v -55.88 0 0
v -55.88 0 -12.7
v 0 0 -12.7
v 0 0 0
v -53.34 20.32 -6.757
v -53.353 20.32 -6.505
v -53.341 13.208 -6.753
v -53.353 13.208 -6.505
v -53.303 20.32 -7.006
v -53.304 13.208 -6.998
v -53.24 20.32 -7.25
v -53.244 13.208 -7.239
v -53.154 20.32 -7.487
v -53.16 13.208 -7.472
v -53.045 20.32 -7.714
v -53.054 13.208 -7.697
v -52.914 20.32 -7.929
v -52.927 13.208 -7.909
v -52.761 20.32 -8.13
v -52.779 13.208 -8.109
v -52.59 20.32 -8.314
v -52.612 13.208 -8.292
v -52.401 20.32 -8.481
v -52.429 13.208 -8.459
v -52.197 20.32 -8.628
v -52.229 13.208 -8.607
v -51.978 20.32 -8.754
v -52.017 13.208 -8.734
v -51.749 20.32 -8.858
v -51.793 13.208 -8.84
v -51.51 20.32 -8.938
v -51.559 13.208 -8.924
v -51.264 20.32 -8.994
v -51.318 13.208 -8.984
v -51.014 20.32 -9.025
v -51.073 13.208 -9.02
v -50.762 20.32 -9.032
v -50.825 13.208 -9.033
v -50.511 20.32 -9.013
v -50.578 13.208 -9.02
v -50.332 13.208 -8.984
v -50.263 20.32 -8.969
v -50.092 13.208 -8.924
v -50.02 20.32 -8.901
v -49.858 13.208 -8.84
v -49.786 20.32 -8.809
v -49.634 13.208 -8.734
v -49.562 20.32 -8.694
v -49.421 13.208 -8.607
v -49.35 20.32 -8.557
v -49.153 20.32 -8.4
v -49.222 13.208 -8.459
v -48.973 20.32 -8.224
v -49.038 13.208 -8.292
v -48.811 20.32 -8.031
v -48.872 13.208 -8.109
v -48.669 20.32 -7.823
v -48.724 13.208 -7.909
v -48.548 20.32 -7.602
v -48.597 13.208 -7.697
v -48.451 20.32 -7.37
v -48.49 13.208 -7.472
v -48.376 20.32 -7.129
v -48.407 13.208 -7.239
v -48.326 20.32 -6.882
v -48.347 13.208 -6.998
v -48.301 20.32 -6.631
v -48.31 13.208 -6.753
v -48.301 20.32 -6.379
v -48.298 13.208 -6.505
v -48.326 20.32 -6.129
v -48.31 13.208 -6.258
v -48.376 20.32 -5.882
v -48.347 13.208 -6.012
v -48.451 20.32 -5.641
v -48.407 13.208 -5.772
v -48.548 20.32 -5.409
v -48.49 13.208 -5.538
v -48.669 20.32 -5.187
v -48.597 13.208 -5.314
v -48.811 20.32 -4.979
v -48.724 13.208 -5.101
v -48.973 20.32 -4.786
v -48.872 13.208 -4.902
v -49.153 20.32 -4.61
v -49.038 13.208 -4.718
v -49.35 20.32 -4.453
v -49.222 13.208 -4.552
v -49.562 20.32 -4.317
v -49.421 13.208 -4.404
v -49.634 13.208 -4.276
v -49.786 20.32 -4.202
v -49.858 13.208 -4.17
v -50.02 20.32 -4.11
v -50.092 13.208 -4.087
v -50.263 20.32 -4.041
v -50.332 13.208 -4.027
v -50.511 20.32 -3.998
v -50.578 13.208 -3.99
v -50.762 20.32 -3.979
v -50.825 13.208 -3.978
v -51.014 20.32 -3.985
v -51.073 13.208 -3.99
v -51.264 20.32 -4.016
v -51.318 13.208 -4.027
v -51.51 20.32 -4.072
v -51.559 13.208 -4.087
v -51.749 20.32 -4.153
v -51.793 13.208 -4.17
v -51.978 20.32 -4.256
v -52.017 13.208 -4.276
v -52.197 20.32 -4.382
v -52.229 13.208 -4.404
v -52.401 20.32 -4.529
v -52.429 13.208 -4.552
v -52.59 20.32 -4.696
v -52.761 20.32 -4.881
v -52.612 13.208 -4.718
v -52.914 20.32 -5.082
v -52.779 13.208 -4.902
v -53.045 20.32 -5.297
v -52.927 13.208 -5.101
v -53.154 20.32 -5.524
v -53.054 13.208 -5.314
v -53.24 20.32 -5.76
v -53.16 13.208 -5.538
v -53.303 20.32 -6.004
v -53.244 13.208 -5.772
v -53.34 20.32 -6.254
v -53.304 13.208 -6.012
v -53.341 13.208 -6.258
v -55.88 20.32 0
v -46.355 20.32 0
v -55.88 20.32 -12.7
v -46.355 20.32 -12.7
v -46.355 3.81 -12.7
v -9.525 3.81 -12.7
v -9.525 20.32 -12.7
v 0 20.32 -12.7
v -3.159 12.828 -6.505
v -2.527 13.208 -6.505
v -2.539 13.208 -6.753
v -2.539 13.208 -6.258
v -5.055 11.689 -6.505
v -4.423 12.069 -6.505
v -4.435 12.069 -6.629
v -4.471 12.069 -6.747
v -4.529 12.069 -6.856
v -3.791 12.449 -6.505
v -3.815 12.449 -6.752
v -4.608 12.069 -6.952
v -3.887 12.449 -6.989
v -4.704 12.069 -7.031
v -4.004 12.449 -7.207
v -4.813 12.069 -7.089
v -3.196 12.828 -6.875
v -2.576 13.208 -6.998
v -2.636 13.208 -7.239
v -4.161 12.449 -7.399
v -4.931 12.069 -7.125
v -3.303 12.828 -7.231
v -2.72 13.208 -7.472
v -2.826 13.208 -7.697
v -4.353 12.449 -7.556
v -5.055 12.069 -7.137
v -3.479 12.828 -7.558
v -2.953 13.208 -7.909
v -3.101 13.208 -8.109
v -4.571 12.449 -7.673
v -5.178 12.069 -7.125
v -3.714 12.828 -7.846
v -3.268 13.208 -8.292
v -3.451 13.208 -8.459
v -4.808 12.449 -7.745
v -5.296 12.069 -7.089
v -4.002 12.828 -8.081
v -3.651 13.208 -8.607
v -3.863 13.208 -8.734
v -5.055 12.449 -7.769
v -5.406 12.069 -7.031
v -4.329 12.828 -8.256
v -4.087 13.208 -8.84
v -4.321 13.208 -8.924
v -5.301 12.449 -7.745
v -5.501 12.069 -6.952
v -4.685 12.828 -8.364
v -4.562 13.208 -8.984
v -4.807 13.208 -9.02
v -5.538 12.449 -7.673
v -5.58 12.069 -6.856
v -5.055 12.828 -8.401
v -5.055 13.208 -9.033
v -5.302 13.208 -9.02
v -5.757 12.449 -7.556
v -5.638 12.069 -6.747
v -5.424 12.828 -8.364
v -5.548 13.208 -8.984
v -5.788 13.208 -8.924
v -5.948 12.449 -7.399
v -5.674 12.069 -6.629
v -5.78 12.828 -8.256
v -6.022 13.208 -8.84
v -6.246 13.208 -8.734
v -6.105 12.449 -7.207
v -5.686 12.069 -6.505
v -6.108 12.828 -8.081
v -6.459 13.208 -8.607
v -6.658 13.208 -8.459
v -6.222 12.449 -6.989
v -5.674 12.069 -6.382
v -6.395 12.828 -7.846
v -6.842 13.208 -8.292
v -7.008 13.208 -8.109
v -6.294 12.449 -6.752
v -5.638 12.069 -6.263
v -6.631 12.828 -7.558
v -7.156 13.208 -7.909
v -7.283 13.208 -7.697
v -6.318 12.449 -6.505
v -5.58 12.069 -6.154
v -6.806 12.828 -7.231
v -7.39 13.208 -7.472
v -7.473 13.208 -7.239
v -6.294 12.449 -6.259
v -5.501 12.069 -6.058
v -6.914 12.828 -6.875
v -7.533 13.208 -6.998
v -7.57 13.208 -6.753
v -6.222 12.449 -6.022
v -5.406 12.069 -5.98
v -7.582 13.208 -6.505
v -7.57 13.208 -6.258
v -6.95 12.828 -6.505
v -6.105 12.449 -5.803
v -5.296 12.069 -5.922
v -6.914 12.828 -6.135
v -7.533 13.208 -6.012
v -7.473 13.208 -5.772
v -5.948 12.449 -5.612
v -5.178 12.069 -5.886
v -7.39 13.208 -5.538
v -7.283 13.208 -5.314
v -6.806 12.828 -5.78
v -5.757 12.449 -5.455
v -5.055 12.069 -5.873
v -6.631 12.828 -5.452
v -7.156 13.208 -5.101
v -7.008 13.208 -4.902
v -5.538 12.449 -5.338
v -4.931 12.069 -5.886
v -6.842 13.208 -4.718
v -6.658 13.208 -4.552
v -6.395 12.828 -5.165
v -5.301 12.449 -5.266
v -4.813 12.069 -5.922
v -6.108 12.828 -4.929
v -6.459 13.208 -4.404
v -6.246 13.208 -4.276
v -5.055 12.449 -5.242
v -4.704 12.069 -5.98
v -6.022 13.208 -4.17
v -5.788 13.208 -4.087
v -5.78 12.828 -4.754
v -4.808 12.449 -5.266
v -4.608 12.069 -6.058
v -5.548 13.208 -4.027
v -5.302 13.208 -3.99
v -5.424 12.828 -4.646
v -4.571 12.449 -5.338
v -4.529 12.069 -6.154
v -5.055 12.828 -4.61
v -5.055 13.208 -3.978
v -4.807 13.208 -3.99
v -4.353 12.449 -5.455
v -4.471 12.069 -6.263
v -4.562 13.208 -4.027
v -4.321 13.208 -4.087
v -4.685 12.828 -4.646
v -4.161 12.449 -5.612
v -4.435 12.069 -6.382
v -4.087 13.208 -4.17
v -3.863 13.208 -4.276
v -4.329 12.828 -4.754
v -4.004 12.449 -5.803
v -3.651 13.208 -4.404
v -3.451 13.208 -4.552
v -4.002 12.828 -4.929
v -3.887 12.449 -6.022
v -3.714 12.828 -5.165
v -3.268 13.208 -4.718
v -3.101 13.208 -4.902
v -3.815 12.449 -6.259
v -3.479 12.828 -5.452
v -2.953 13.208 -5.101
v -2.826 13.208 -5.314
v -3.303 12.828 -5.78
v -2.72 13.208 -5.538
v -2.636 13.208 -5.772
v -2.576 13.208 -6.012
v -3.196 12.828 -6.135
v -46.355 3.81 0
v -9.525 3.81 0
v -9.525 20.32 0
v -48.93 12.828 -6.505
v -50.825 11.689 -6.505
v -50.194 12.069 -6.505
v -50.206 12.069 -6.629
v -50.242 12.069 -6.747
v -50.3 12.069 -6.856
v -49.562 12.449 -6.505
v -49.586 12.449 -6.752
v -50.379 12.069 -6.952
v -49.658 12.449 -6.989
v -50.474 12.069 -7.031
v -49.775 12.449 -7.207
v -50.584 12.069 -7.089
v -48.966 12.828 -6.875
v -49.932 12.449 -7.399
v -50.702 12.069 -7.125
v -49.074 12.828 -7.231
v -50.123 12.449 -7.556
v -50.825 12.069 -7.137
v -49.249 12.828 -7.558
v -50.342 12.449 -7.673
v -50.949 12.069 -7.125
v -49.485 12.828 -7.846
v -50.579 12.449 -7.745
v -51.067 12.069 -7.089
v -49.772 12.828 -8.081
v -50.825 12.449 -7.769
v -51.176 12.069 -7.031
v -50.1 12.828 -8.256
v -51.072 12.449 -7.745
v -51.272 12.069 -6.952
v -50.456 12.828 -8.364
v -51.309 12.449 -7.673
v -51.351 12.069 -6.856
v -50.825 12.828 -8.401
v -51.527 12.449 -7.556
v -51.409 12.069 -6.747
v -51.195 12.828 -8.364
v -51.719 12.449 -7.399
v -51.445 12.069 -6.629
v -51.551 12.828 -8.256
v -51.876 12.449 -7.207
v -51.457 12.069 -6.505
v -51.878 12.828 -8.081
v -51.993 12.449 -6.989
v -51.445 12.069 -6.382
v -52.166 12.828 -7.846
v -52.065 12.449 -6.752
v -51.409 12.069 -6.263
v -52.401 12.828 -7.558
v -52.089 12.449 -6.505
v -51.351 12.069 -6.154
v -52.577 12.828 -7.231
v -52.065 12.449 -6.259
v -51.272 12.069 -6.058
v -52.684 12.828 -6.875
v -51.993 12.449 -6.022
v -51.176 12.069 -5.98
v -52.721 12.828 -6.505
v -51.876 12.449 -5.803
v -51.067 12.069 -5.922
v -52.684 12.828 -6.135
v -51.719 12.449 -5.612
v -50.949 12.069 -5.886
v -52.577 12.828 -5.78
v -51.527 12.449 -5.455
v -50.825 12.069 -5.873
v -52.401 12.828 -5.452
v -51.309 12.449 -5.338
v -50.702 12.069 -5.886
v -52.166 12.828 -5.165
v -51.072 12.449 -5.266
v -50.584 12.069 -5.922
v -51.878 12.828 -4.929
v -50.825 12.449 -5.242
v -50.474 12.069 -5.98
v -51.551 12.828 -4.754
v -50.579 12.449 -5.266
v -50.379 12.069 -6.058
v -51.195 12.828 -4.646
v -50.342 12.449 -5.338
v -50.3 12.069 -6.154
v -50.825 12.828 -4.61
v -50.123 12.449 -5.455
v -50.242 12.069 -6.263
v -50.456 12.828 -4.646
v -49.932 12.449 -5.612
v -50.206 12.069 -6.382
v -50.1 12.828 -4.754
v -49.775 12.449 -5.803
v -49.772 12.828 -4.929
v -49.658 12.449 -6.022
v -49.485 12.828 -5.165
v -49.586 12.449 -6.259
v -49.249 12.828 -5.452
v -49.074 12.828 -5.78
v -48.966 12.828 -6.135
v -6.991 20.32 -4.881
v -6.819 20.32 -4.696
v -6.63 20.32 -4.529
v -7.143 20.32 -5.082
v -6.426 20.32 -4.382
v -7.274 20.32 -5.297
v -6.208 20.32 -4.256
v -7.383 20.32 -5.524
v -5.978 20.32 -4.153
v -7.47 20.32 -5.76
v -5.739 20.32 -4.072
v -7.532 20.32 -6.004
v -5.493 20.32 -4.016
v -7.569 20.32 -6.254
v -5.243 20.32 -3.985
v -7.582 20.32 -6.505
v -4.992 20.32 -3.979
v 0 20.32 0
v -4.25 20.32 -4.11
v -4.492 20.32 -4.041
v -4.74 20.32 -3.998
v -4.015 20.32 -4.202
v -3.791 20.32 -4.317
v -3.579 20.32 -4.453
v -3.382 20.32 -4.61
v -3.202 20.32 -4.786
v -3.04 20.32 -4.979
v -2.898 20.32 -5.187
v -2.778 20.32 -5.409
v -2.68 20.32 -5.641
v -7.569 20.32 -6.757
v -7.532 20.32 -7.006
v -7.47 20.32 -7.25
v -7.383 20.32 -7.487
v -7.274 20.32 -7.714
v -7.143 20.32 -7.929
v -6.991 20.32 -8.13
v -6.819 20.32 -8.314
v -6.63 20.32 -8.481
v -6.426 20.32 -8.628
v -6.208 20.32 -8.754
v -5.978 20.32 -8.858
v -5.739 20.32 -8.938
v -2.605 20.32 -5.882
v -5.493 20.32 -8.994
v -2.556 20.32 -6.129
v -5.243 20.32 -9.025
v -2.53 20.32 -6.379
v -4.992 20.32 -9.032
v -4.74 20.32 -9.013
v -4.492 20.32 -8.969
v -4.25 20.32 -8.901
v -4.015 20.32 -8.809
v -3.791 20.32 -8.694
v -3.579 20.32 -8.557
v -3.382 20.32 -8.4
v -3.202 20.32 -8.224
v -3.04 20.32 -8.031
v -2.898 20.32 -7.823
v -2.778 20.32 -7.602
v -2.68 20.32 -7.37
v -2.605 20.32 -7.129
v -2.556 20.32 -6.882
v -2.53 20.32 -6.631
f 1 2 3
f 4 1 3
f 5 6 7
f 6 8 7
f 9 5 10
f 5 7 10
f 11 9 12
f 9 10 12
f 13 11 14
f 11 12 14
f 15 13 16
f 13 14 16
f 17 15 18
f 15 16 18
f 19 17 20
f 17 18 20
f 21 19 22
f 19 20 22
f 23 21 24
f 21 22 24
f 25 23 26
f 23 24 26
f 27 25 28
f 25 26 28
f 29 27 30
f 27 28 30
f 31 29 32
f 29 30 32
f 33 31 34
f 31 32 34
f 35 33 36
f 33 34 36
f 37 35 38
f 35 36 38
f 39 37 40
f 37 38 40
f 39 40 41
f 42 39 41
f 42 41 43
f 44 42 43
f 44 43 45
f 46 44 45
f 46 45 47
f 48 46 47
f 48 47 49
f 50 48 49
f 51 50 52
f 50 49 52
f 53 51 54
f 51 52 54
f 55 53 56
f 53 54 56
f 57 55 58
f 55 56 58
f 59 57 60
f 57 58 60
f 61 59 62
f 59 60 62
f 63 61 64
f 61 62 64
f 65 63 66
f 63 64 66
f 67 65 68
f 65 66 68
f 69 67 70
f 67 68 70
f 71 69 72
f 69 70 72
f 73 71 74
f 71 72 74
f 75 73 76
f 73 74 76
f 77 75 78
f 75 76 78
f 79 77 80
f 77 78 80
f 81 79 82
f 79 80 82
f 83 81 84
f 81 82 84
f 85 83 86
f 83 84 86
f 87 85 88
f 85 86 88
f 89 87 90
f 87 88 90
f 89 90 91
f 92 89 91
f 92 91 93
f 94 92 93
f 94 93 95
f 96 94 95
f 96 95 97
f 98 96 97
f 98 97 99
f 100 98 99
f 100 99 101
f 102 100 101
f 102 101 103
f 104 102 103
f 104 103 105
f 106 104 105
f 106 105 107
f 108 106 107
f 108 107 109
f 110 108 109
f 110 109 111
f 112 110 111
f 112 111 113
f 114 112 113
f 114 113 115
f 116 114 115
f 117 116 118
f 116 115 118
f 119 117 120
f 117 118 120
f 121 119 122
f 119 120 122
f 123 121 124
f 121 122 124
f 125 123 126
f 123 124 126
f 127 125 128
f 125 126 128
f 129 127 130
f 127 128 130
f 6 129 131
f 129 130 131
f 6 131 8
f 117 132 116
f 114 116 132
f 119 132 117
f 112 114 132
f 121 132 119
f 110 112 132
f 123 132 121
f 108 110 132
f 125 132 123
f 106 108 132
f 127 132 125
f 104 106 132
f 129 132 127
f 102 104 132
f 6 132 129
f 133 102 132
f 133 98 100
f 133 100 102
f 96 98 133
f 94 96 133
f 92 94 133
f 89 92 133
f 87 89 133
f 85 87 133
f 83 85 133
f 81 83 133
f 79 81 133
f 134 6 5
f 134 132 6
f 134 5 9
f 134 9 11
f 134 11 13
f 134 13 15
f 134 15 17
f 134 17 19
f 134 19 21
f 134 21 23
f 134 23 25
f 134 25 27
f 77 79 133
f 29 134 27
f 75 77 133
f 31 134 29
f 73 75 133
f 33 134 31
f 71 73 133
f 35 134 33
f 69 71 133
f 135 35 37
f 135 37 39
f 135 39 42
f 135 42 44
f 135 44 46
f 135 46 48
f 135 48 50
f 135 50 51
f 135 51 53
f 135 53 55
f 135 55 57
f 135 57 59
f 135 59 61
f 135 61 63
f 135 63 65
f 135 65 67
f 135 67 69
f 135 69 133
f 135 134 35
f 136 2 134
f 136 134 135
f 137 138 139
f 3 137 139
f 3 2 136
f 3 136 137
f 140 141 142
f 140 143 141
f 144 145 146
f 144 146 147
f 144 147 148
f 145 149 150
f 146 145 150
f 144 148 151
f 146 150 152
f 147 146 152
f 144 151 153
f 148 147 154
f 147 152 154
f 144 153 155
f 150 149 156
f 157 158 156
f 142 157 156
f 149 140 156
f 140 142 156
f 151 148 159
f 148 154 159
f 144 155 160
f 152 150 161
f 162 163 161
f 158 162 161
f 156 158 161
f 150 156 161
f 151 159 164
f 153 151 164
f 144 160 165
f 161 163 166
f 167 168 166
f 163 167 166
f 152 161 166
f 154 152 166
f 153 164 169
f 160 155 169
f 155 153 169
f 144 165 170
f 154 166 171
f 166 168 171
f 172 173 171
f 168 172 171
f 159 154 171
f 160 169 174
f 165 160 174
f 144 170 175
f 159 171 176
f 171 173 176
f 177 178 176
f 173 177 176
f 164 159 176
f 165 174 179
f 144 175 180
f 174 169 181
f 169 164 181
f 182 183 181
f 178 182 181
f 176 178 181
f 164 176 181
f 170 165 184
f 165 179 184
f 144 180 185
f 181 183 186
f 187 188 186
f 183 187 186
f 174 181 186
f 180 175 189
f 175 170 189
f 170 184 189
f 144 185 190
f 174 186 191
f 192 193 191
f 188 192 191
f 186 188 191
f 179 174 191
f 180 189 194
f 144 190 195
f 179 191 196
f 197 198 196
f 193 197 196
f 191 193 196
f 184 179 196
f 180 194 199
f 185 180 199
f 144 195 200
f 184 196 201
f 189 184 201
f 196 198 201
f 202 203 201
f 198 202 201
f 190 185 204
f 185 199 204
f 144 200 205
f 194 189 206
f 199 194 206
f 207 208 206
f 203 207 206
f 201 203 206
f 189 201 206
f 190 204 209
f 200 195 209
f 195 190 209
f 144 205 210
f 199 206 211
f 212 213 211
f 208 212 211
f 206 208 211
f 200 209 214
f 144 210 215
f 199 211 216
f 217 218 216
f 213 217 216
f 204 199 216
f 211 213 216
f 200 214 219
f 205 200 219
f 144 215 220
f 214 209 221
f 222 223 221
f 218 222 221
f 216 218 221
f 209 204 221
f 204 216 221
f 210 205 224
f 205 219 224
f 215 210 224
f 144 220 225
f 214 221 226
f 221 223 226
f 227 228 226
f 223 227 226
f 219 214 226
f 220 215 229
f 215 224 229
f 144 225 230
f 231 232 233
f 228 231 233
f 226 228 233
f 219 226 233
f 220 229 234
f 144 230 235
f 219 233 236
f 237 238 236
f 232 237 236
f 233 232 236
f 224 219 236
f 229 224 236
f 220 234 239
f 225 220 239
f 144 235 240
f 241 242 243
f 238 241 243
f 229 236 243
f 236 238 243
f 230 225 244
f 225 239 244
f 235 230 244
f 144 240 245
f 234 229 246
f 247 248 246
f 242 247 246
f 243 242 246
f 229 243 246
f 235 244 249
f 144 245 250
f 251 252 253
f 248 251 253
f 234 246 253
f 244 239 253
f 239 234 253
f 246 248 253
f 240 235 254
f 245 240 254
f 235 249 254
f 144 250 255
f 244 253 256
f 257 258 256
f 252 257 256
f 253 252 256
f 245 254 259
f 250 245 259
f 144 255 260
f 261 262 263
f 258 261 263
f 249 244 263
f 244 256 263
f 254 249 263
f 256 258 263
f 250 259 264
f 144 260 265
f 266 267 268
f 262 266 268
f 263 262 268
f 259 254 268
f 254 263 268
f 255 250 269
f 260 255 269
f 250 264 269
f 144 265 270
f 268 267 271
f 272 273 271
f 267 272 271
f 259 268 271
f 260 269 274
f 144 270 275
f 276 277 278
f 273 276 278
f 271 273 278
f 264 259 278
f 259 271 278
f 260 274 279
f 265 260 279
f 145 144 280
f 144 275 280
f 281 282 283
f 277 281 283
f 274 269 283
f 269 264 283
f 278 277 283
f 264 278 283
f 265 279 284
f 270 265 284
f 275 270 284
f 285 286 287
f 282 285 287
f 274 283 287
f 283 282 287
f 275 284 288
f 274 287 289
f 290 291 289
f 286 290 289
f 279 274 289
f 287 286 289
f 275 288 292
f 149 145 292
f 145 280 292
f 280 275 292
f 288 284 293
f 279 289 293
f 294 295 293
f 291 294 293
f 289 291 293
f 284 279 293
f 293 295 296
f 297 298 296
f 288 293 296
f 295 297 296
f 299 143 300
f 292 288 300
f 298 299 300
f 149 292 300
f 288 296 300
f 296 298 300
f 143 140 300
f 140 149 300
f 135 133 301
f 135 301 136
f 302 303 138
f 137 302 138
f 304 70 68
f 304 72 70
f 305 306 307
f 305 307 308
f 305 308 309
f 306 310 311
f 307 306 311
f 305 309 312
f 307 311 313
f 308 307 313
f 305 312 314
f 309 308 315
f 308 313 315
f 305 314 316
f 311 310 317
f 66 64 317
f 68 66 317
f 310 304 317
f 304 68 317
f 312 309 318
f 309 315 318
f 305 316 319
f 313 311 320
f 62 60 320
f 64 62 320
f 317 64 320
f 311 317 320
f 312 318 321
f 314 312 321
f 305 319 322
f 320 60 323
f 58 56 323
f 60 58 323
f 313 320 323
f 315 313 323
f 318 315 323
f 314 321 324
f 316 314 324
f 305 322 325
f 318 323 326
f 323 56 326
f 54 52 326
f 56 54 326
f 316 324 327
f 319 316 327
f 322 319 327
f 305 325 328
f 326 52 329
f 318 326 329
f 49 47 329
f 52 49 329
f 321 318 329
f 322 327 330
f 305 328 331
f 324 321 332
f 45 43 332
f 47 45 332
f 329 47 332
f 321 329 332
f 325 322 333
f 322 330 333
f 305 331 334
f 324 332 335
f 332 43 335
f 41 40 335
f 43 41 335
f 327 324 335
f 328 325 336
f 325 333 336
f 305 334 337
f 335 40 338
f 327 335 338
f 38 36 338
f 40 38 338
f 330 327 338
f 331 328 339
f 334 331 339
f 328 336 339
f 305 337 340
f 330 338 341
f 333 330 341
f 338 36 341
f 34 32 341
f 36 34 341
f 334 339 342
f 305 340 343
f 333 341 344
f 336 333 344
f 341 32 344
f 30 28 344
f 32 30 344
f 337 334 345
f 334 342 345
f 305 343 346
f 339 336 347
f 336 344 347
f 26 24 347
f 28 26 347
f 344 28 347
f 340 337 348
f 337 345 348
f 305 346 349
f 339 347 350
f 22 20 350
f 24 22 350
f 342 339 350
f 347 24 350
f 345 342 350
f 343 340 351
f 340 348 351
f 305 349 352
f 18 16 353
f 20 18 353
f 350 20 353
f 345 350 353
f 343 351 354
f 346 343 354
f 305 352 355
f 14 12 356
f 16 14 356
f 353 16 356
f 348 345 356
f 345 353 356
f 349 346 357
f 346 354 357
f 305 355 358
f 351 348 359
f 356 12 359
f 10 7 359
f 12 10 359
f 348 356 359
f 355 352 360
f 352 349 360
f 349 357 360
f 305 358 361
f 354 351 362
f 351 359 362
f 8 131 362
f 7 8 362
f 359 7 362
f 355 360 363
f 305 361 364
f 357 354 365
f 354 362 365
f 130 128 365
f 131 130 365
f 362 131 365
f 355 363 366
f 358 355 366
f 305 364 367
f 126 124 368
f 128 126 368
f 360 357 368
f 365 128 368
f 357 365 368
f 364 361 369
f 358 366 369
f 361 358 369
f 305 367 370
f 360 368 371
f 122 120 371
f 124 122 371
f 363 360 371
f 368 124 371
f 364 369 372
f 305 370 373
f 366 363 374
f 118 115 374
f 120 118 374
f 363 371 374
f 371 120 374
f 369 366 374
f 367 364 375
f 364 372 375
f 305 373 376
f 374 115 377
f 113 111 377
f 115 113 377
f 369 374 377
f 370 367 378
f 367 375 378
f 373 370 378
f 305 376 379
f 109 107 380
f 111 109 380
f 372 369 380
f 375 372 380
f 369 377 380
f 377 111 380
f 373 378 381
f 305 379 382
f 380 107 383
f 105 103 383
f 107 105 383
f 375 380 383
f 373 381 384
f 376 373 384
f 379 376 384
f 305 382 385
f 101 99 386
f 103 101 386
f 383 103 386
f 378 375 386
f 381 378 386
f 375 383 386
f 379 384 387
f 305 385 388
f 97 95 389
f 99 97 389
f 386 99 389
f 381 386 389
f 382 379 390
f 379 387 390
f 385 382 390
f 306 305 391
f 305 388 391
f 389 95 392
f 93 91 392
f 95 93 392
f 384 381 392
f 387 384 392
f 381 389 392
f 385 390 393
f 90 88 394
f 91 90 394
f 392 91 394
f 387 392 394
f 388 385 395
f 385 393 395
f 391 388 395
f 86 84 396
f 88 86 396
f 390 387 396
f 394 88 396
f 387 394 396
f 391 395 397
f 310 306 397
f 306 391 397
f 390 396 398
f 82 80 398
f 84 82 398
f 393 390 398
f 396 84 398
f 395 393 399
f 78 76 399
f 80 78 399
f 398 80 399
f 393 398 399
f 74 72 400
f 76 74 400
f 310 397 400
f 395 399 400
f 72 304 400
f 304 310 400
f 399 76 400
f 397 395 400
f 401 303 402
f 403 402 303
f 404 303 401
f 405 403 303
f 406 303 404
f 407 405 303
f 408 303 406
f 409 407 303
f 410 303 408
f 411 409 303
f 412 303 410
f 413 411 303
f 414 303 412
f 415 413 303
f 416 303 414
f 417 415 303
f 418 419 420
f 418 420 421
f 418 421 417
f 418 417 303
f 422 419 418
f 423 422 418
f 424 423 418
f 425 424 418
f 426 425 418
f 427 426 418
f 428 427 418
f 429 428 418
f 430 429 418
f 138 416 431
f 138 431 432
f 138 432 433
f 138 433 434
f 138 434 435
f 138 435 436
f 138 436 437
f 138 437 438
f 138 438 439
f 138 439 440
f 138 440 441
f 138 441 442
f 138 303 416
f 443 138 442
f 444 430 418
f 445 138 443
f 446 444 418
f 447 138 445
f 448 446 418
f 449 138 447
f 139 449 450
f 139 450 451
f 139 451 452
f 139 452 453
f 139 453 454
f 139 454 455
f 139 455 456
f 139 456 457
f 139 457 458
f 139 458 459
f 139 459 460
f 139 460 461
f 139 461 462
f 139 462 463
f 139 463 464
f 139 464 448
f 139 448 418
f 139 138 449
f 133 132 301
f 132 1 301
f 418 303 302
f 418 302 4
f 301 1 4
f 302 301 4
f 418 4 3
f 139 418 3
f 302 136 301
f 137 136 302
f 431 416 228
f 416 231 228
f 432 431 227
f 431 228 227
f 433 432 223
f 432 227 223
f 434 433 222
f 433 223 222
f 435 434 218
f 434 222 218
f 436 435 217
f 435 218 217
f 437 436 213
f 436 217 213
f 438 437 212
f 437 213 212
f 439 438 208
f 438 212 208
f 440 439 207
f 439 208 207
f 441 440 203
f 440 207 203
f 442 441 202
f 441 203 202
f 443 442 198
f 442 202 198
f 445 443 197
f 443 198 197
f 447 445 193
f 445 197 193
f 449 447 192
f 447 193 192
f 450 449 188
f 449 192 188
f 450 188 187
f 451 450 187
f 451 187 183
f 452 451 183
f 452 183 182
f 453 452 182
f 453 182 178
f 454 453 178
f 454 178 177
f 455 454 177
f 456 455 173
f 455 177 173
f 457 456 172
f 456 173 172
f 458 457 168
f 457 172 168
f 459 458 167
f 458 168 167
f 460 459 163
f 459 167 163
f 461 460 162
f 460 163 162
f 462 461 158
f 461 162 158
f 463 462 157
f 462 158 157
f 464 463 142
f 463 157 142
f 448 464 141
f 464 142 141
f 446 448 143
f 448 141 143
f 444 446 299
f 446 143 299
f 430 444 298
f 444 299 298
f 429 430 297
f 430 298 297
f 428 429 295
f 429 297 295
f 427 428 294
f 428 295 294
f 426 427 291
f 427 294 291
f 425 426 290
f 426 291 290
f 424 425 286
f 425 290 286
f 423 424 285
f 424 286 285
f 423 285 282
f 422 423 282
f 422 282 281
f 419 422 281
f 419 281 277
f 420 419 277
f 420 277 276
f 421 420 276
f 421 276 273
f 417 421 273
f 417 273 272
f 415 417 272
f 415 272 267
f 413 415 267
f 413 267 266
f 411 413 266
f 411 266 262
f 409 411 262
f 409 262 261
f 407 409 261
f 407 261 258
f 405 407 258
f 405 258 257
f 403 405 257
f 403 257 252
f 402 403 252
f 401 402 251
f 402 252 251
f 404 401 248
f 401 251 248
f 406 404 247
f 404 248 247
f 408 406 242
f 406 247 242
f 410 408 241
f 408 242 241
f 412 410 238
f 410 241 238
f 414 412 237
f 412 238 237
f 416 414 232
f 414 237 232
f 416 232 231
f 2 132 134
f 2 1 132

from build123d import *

# Parameters (mm, degrees)
SKETCH1_W                      = 55.88
SKETCH1_H                      = 12.7
BOSS_EXTRUDE1_DEPTH            = 3.81
SKETCH2_W                      = 9.525
SKETCH2_H                      = 12.7
BOSS_EXTRUDE2_DEPTH            = 16.51
F_8_0_199_DIAMETER_HOLE1_D     = 5.0546
F_8_0_199_DIAMETER_HOLE1_DEPTH = 7.112
F_8_0_199_DIAMETER_HOLE1_TIP   = 1.518555042


with BuildPart() as part:
    # Sketch1 → Boss-Extrude1 (new body)
    with BuildSketch(Plane(origin=(0, 0, 0), x_dir=(1, 0, 0), z_dir=(0, 1, 0))):
        with Locations((-27.94, 6.35)):
            Rectangle(SKETCH1_W, SKETCH1_H)
    extrude(amount=BOSS_EXTRUDE1_DEPTH)

    # Sketch2 → Boss-Extrude2 (add)
    with BuildSketch(Plane(origin=(0, 3.81, 0), x_dir=(1, 0, 0), z_dir=(0, 1, 0))):
        with Locations((-51.1175, 6.35)):
            Rectangle(SKETCH2_W, SKETCH2_H)
        with Locations((-4.7625, 6.35)):
            Rectangle(SKETCH2_W, SKETCH2_H)
    extrude(amount=BOSS_EXTRUDE2_DEPTH)

    # #8 (0.199) Diameter Hole1
    with Locations(Plane(origin=(0, 20.32, 0), x_dir=(1, 0, 0), z_dir=(0, 1, 0))):
        with Locations((-50.8254, 6.505248616), (-5.0546, 6.505248616)):
            Hole(F_8_0_199_DIAMETER_HOLE1_D / 2, depth=F_8_0_199_DIAMETER_HOLE1_DEPTH)
            with Locations((0, 0, -(F_8_0_199_DIAMETER_HOLE1_DEPTH + F_8_0_199_DIAMETER_HOLE1_TIP / 2))):  # 118° drill point
                Cone(0, F_8_0_199_DIAMETER_HOLE1_D / 2, F_8_0_199_DIAMETER_HOLE1_TIP, mode=Mode.SUBTRACT)


solid = part.part
